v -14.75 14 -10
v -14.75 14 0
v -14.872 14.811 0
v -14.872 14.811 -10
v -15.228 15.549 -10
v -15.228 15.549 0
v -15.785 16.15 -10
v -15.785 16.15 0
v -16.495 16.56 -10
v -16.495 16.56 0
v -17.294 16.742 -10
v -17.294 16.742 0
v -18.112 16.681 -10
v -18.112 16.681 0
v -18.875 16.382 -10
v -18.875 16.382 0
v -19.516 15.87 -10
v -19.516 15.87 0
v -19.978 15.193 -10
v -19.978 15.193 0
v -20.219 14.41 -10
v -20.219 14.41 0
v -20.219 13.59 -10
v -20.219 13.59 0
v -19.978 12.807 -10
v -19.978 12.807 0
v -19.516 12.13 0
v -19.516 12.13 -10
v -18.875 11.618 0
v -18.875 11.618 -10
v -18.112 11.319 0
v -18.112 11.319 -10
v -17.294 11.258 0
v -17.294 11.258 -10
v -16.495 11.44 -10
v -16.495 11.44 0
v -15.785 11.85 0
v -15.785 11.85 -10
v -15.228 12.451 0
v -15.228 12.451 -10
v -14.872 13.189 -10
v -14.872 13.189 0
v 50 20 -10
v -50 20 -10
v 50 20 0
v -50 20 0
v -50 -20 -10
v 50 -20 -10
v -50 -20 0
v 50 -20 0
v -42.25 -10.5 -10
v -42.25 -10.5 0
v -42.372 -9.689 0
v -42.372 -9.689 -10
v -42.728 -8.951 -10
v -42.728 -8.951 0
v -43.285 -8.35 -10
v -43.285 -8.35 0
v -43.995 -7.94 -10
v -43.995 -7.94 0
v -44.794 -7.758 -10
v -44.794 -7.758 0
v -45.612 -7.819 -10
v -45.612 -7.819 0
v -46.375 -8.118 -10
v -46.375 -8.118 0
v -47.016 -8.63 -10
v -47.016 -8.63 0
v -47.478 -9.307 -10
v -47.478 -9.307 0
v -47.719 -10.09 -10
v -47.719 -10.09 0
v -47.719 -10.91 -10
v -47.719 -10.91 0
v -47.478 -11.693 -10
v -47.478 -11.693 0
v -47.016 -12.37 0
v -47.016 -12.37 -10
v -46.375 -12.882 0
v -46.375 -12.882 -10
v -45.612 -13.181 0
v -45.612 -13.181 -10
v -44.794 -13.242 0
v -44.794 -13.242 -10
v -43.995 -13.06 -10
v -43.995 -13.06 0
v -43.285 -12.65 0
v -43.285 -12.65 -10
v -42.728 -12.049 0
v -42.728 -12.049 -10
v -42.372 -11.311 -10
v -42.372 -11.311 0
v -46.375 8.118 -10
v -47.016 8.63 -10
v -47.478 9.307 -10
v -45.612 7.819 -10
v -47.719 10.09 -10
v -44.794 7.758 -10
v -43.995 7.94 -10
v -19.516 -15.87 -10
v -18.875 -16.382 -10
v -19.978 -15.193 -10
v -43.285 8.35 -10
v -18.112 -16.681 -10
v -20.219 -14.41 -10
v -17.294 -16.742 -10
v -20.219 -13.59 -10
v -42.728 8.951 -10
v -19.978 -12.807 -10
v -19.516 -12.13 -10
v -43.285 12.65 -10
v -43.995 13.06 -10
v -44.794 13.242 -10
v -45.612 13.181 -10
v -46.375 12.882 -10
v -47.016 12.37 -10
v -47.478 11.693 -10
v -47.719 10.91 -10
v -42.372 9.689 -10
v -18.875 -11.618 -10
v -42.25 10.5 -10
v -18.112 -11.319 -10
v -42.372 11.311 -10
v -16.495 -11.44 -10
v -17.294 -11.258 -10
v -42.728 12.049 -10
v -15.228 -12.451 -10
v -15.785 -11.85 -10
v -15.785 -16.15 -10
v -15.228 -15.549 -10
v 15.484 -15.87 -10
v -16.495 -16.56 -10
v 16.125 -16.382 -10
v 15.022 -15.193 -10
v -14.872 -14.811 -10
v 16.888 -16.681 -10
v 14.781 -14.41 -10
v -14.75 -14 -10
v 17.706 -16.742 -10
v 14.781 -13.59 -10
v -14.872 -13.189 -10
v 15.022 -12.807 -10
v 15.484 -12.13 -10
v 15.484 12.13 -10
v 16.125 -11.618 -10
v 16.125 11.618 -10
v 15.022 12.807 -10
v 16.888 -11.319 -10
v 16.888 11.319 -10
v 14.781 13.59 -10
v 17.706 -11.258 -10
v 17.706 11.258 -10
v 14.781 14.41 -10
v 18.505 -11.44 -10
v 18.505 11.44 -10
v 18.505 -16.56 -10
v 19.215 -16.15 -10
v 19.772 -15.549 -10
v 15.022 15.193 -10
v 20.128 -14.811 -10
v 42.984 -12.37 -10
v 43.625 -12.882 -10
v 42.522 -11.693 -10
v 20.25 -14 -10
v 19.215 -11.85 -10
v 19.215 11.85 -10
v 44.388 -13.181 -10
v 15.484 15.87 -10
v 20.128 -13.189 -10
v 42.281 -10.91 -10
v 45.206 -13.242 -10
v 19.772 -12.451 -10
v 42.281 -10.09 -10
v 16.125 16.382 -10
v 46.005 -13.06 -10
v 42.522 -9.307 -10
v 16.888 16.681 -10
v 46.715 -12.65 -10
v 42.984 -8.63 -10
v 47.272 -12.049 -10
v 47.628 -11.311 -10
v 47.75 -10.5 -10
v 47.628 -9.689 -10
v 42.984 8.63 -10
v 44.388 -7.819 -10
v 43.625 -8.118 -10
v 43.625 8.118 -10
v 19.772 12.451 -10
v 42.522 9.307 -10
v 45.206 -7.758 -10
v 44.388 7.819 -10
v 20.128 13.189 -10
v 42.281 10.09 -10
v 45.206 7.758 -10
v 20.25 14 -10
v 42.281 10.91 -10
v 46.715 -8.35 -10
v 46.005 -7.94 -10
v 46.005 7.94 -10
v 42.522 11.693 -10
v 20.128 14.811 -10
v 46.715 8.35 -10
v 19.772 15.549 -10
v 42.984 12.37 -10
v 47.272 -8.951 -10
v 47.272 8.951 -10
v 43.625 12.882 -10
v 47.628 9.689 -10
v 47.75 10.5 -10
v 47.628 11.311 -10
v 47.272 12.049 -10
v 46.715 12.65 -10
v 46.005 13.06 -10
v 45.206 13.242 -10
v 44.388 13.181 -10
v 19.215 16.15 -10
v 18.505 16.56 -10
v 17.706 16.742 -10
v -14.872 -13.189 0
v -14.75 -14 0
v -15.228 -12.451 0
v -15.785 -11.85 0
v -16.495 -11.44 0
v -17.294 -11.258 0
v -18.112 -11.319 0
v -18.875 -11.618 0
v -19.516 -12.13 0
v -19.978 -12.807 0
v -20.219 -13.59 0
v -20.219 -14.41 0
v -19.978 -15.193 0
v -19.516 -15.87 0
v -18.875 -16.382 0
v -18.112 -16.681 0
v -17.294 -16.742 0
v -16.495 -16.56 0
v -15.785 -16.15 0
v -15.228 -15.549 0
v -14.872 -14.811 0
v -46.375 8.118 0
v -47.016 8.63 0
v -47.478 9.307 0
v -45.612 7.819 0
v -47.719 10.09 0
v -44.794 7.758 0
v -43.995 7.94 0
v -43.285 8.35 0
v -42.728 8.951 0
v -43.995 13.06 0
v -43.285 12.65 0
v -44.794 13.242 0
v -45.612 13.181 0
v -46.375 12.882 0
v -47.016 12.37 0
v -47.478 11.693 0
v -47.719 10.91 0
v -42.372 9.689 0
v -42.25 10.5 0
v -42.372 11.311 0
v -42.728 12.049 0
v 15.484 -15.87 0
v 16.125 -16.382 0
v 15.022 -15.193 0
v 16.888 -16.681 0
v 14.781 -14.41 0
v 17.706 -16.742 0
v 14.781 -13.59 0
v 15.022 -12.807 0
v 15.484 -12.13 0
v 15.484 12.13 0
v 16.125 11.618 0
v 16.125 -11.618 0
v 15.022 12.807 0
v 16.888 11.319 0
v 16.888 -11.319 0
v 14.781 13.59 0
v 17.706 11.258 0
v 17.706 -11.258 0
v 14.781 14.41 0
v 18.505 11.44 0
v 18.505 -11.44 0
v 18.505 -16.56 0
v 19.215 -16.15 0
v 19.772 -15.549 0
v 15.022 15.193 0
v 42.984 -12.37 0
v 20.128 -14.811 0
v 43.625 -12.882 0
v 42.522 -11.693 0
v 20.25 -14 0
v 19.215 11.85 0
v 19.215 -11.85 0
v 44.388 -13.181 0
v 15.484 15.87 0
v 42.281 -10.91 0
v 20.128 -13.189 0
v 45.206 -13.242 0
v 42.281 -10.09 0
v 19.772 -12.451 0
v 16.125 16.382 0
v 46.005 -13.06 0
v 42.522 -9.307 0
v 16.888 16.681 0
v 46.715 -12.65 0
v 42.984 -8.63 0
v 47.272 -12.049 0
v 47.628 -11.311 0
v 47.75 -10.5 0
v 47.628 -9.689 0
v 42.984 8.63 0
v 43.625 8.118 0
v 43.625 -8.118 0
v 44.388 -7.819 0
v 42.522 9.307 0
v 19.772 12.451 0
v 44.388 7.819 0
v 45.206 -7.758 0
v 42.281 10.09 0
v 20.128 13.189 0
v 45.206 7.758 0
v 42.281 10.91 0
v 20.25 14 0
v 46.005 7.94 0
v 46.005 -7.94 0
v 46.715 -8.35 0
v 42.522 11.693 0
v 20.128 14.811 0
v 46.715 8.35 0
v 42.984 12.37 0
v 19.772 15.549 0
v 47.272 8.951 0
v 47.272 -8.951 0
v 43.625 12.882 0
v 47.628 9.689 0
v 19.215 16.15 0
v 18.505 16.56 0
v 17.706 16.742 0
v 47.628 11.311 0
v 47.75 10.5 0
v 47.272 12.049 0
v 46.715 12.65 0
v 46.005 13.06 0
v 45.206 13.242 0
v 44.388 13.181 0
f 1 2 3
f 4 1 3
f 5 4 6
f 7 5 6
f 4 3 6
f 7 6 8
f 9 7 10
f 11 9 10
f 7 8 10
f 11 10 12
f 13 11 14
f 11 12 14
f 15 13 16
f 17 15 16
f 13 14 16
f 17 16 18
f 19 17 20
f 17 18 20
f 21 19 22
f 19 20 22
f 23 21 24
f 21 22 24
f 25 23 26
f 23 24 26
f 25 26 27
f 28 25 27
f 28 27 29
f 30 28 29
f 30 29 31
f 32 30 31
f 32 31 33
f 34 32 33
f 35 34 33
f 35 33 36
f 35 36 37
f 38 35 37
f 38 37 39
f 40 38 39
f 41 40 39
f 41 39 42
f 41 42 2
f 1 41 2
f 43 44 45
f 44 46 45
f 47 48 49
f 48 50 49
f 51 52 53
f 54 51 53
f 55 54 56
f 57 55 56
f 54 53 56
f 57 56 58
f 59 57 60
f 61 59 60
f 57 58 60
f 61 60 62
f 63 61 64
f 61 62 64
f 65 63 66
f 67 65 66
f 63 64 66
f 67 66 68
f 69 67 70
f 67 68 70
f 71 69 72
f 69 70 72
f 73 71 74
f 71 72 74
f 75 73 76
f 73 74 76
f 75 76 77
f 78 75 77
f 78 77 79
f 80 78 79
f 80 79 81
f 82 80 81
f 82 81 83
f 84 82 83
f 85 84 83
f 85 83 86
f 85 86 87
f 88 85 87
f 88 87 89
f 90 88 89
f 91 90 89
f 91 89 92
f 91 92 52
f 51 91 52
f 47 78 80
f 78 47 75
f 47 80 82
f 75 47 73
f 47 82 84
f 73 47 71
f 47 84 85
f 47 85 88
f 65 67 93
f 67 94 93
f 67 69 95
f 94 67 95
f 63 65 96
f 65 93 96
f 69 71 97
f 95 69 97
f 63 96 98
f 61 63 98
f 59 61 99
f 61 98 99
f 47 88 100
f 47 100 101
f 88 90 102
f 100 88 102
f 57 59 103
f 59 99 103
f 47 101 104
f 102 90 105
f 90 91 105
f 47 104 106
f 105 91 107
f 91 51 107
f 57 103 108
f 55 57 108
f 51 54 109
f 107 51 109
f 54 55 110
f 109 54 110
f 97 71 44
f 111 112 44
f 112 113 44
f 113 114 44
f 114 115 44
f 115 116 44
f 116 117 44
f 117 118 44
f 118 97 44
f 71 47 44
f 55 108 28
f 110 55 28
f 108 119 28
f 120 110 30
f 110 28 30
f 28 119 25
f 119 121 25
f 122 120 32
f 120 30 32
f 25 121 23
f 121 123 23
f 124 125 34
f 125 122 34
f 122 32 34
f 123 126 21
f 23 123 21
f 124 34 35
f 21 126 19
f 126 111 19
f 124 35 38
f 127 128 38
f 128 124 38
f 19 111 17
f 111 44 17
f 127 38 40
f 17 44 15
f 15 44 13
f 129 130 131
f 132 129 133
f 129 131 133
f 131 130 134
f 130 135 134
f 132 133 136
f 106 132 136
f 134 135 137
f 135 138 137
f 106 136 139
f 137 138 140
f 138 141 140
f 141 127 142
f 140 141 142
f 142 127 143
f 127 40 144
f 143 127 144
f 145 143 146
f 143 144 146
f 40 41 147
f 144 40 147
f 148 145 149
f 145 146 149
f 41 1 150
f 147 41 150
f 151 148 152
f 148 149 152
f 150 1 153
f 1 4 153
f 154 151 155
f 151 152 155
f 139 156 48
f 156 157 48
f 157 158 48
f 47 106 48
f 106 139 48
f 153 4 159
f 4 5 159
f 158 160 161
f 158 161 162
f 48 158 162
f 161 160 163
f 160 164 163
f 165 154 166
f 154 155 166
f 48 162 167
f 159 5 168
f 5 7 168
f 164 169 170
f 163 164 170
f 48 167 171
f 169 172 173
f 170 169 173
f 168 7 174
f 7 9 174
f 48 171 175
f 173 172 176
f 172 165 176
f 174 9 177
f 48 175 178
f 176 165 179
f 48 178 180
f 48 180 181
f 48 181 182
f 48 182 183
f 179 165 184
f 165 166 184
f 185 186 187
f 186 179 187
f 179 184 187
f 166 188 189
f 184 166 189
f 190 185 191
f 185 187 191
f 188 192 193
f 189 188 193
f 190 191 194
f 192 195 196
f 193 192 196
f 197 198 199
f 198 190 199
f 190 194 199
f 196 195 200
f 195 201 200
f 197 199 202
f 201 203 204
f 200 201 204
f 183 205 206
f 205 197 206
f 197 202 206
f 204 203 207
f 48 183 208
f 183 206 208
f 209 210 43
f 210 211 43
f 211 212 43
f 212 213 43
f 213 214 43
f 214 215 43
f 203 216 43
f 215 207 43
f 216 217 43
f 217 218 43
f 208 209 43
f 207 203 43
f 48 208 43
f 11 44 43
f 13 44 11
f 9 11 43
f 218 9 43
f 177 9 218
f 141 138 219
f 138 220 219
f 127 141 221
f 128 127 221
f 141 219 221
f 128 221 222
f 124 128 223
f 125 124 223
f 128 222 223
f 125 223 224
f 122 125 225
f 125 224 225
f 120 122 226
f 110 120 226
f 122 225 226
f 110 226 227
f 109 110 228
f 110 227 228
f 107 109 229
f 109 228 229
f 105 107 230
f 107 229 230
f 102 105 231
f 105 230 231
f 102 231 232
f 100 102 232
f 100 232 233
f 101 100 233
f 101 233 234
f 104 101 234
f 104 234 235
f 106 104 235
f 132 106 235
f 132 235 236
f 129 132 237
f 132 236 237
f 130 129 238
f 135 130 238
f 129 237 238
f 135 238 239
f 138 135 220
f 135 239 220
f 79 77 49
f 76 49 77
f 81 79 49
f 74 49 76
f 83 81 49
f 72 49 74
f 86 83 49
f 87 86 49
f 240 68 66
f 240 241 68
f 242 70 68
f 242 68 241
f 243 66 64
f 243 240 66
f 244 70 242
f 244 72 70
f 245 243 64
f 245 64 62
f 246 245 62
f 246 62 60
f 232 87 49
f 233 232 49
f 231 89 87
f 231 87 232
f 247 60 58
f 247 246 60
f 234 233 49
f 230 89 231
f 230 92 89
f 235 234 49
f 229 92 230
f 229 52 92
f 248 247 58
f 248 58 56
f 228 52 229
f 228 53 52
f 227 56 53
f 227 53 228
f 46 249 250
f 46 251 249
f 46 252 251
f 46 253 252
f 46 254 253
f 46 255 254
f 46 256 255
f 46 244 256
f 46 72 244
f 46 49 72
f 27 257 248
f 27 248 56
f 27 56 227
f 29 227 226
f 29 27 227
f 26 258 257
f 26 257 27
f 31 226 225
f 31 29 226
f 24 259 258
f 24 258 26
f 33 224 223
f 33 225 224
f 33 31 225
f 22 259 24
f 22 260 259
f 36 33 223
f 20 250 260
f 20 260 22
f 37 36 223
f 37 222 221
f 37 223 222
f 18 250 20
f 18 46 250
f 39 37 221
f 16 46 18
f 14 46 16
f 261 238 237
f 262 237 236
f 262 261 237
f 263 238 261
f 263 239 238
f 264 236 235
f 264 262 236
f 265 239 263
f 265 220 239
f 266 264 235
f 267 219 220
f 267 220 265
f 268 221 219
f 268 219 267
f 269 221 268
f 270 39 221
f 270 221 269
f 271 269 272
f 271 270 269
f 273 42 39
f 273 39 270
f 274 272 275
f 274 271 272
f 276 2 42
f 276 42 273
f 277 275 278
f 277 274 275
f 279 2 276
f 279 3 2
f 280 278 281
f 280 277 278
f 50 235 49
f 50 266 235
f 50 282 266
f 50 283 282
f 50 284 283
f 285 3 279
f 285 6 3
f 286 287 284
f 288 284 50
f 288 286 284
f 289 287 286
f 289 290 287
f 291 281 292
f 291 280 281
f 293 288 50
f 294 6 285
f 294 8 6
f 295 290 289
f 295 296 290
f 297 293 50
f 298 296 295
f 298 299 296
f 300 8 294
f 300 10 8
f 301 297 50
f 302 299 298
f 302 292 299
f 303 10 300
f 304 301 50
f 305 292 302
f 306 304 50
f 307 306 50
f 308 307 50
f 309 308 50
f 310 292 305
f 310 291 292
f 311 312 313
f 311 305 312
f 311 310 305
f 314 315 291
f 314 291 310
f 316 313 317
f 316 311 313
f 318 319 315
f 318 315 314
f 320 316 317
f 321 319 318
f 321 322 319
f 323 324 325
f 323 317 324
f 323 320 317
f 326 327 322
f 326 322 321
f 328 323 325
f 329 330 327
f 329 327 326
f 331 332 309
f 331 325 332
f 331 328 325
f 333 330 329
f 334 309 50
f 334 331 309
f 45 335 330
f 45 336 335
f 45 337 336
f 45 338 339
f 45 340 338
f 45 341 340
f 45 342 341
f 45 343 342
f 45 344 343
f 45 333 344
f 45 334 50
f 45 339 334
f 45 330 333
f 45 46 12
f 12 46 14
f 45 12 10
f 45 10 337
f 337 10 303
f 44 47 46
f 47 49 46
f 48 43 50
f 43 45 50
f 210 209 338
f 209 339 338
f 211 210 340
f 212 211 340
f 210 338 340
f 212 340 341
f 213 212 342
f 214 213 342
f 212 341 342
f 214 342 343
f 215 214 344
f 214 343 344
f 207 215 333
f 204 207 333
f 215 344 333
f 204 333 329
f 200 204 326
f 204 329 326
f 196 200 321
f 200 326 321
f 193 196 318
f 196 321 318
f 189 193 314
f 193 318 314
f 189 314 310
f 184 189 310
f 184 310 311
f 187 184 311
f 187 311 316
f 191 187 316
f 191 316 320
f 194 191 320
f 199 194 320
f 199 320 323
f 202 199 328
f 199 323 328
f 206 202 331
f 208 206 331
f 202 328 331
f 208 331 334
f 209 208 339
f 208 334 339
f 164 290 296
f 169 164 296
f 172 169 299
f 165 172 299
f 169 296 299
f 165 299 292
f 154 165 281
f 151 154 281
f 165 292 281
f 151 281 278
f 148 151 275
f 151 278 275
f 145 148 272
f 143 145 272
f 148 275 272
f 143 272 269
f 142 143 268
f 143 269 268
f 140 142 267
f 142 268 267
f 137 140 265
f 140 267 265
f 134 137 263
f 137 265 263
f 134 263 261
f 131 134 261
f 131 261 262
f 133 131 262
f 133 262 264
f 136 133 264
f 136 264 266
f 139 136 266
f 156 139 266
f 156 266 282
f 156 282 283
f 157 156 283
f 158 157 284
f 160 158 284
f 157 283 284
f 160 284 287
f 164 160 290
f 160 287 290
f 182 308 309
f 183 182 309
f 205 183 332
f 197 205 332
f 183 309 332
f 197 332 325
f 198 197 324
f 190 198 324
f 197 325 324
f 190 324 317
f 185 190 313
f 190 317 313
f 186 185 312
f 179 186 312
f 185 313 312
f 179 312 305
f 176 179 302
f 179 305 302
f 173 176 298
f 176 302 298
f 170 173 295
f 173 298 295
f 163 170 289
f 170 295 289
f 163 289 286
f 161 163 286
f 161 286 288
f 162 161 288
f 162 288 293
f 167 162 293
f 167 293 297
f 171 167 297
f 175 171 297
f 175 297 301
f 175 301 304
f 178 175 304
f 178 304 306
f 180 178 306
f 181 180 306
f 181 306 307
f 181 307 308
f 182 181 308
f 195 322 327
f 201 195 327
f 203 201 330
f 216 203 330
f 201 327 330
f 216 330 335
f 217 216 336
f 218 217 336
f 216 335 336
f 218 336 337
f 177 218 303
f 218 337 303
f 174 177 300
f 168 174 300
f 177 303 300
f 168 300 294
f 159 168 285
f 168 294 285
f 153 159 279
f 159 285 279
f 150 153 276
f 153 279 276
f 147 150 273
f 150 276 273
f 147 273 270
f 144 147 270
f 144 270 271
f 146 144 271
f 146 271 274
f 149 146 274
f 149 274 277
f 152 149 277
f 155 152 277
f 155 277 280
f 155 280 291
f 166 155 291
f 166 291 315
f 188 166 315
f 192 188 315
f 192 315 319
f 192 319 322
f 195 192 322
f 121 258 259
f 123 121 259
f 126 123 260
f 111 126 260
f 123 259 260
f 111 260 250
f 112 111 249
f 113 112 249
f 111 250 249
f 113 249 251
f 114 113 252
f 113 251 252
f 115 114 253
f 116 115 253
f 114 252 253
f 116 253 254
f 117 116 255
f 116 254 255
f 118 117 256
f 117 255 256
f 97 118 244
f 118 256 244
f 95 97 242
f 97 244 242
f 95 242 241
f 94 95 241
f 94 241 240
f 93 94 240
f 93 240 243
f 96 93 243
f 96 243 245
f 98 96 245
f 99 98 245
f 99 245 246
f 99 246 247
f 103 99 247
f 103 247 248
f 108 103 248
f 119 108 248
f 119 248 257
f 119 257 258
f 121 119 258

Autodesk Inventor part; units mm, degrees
ref_plane "YZ Plane" through (0, 0, 0) normal (1, 0, 0) x (0, 1, 0)
ref_plane "XZ Plane" through (0, 0, 0) normal (0, 1, 0) x (-1, 0, 0)
ref_plane "XY Plane" through (0, 0, 0) normal (0, 0, 1) x (1, 0, 0)
sketch "Sketch1" plane through (0, 0, 0) normal (0, 0, 1) x (1, 0, 0)
  line L0 (-50, 20) -> (50, 20)
  line L1 (50, 20) -> (50, -20)
  line L2 (50, -20) -> (-50, -20)
  line L3 (-50, -20) -> (-50, 20)
  circle A0 centre (-45, 10.5) radius 2.75
  circle A1 centre (-45, -10.5) radius 2.75
  circle A2 centre (45, 10.5) radius 2.75
  circle A3 centre (45, -10.5) radius 2.75
  line L4 (-45, 10.5) -> (-45, -10.5) construction
  point P0 (0, 0)
  point P1 (-50, 0)
  point P2 (0, 20)
  point P3 (-45, 0)
  dimension "d0" = 40
  dimension "d1" = 100
  dimension "d2" = 5.5
  dimension "d3" = 5.5
  dimension "d4" = 5
  dimension "d7" = 5
  dimension "d10" = 90
  dimension "d29" = 21
sketch "Sketch2" plane through (0, 0, 0) normal (0, 0, 1) x (1, 0, 0)
  circle A0 centre (-17.5, 14) radius 2.75
  circle A1 centre (17.5, 14) radius 2.75
  line L0 (-17.5, 14) -> (17.5, 14) construction
  line L1 (0, 0) -> (0, 14) construction
  circle A2 centre (-17.5, -14) radius 2.75
  circle A3 centre (17.5, -14) radius 2.75
  dimension "d15" = 5.5
  dimension "d17" = 5.5
  dimension "d20" = 35
  dimension "d21" = 14
  dimension "d24" = 28
extrude "Extrusion1" add sketch "Sketch1" against normal blind 10
extrude "Extrusion2" cut sketch "Sketch2" against normal through all
properties part number "casterplate"
